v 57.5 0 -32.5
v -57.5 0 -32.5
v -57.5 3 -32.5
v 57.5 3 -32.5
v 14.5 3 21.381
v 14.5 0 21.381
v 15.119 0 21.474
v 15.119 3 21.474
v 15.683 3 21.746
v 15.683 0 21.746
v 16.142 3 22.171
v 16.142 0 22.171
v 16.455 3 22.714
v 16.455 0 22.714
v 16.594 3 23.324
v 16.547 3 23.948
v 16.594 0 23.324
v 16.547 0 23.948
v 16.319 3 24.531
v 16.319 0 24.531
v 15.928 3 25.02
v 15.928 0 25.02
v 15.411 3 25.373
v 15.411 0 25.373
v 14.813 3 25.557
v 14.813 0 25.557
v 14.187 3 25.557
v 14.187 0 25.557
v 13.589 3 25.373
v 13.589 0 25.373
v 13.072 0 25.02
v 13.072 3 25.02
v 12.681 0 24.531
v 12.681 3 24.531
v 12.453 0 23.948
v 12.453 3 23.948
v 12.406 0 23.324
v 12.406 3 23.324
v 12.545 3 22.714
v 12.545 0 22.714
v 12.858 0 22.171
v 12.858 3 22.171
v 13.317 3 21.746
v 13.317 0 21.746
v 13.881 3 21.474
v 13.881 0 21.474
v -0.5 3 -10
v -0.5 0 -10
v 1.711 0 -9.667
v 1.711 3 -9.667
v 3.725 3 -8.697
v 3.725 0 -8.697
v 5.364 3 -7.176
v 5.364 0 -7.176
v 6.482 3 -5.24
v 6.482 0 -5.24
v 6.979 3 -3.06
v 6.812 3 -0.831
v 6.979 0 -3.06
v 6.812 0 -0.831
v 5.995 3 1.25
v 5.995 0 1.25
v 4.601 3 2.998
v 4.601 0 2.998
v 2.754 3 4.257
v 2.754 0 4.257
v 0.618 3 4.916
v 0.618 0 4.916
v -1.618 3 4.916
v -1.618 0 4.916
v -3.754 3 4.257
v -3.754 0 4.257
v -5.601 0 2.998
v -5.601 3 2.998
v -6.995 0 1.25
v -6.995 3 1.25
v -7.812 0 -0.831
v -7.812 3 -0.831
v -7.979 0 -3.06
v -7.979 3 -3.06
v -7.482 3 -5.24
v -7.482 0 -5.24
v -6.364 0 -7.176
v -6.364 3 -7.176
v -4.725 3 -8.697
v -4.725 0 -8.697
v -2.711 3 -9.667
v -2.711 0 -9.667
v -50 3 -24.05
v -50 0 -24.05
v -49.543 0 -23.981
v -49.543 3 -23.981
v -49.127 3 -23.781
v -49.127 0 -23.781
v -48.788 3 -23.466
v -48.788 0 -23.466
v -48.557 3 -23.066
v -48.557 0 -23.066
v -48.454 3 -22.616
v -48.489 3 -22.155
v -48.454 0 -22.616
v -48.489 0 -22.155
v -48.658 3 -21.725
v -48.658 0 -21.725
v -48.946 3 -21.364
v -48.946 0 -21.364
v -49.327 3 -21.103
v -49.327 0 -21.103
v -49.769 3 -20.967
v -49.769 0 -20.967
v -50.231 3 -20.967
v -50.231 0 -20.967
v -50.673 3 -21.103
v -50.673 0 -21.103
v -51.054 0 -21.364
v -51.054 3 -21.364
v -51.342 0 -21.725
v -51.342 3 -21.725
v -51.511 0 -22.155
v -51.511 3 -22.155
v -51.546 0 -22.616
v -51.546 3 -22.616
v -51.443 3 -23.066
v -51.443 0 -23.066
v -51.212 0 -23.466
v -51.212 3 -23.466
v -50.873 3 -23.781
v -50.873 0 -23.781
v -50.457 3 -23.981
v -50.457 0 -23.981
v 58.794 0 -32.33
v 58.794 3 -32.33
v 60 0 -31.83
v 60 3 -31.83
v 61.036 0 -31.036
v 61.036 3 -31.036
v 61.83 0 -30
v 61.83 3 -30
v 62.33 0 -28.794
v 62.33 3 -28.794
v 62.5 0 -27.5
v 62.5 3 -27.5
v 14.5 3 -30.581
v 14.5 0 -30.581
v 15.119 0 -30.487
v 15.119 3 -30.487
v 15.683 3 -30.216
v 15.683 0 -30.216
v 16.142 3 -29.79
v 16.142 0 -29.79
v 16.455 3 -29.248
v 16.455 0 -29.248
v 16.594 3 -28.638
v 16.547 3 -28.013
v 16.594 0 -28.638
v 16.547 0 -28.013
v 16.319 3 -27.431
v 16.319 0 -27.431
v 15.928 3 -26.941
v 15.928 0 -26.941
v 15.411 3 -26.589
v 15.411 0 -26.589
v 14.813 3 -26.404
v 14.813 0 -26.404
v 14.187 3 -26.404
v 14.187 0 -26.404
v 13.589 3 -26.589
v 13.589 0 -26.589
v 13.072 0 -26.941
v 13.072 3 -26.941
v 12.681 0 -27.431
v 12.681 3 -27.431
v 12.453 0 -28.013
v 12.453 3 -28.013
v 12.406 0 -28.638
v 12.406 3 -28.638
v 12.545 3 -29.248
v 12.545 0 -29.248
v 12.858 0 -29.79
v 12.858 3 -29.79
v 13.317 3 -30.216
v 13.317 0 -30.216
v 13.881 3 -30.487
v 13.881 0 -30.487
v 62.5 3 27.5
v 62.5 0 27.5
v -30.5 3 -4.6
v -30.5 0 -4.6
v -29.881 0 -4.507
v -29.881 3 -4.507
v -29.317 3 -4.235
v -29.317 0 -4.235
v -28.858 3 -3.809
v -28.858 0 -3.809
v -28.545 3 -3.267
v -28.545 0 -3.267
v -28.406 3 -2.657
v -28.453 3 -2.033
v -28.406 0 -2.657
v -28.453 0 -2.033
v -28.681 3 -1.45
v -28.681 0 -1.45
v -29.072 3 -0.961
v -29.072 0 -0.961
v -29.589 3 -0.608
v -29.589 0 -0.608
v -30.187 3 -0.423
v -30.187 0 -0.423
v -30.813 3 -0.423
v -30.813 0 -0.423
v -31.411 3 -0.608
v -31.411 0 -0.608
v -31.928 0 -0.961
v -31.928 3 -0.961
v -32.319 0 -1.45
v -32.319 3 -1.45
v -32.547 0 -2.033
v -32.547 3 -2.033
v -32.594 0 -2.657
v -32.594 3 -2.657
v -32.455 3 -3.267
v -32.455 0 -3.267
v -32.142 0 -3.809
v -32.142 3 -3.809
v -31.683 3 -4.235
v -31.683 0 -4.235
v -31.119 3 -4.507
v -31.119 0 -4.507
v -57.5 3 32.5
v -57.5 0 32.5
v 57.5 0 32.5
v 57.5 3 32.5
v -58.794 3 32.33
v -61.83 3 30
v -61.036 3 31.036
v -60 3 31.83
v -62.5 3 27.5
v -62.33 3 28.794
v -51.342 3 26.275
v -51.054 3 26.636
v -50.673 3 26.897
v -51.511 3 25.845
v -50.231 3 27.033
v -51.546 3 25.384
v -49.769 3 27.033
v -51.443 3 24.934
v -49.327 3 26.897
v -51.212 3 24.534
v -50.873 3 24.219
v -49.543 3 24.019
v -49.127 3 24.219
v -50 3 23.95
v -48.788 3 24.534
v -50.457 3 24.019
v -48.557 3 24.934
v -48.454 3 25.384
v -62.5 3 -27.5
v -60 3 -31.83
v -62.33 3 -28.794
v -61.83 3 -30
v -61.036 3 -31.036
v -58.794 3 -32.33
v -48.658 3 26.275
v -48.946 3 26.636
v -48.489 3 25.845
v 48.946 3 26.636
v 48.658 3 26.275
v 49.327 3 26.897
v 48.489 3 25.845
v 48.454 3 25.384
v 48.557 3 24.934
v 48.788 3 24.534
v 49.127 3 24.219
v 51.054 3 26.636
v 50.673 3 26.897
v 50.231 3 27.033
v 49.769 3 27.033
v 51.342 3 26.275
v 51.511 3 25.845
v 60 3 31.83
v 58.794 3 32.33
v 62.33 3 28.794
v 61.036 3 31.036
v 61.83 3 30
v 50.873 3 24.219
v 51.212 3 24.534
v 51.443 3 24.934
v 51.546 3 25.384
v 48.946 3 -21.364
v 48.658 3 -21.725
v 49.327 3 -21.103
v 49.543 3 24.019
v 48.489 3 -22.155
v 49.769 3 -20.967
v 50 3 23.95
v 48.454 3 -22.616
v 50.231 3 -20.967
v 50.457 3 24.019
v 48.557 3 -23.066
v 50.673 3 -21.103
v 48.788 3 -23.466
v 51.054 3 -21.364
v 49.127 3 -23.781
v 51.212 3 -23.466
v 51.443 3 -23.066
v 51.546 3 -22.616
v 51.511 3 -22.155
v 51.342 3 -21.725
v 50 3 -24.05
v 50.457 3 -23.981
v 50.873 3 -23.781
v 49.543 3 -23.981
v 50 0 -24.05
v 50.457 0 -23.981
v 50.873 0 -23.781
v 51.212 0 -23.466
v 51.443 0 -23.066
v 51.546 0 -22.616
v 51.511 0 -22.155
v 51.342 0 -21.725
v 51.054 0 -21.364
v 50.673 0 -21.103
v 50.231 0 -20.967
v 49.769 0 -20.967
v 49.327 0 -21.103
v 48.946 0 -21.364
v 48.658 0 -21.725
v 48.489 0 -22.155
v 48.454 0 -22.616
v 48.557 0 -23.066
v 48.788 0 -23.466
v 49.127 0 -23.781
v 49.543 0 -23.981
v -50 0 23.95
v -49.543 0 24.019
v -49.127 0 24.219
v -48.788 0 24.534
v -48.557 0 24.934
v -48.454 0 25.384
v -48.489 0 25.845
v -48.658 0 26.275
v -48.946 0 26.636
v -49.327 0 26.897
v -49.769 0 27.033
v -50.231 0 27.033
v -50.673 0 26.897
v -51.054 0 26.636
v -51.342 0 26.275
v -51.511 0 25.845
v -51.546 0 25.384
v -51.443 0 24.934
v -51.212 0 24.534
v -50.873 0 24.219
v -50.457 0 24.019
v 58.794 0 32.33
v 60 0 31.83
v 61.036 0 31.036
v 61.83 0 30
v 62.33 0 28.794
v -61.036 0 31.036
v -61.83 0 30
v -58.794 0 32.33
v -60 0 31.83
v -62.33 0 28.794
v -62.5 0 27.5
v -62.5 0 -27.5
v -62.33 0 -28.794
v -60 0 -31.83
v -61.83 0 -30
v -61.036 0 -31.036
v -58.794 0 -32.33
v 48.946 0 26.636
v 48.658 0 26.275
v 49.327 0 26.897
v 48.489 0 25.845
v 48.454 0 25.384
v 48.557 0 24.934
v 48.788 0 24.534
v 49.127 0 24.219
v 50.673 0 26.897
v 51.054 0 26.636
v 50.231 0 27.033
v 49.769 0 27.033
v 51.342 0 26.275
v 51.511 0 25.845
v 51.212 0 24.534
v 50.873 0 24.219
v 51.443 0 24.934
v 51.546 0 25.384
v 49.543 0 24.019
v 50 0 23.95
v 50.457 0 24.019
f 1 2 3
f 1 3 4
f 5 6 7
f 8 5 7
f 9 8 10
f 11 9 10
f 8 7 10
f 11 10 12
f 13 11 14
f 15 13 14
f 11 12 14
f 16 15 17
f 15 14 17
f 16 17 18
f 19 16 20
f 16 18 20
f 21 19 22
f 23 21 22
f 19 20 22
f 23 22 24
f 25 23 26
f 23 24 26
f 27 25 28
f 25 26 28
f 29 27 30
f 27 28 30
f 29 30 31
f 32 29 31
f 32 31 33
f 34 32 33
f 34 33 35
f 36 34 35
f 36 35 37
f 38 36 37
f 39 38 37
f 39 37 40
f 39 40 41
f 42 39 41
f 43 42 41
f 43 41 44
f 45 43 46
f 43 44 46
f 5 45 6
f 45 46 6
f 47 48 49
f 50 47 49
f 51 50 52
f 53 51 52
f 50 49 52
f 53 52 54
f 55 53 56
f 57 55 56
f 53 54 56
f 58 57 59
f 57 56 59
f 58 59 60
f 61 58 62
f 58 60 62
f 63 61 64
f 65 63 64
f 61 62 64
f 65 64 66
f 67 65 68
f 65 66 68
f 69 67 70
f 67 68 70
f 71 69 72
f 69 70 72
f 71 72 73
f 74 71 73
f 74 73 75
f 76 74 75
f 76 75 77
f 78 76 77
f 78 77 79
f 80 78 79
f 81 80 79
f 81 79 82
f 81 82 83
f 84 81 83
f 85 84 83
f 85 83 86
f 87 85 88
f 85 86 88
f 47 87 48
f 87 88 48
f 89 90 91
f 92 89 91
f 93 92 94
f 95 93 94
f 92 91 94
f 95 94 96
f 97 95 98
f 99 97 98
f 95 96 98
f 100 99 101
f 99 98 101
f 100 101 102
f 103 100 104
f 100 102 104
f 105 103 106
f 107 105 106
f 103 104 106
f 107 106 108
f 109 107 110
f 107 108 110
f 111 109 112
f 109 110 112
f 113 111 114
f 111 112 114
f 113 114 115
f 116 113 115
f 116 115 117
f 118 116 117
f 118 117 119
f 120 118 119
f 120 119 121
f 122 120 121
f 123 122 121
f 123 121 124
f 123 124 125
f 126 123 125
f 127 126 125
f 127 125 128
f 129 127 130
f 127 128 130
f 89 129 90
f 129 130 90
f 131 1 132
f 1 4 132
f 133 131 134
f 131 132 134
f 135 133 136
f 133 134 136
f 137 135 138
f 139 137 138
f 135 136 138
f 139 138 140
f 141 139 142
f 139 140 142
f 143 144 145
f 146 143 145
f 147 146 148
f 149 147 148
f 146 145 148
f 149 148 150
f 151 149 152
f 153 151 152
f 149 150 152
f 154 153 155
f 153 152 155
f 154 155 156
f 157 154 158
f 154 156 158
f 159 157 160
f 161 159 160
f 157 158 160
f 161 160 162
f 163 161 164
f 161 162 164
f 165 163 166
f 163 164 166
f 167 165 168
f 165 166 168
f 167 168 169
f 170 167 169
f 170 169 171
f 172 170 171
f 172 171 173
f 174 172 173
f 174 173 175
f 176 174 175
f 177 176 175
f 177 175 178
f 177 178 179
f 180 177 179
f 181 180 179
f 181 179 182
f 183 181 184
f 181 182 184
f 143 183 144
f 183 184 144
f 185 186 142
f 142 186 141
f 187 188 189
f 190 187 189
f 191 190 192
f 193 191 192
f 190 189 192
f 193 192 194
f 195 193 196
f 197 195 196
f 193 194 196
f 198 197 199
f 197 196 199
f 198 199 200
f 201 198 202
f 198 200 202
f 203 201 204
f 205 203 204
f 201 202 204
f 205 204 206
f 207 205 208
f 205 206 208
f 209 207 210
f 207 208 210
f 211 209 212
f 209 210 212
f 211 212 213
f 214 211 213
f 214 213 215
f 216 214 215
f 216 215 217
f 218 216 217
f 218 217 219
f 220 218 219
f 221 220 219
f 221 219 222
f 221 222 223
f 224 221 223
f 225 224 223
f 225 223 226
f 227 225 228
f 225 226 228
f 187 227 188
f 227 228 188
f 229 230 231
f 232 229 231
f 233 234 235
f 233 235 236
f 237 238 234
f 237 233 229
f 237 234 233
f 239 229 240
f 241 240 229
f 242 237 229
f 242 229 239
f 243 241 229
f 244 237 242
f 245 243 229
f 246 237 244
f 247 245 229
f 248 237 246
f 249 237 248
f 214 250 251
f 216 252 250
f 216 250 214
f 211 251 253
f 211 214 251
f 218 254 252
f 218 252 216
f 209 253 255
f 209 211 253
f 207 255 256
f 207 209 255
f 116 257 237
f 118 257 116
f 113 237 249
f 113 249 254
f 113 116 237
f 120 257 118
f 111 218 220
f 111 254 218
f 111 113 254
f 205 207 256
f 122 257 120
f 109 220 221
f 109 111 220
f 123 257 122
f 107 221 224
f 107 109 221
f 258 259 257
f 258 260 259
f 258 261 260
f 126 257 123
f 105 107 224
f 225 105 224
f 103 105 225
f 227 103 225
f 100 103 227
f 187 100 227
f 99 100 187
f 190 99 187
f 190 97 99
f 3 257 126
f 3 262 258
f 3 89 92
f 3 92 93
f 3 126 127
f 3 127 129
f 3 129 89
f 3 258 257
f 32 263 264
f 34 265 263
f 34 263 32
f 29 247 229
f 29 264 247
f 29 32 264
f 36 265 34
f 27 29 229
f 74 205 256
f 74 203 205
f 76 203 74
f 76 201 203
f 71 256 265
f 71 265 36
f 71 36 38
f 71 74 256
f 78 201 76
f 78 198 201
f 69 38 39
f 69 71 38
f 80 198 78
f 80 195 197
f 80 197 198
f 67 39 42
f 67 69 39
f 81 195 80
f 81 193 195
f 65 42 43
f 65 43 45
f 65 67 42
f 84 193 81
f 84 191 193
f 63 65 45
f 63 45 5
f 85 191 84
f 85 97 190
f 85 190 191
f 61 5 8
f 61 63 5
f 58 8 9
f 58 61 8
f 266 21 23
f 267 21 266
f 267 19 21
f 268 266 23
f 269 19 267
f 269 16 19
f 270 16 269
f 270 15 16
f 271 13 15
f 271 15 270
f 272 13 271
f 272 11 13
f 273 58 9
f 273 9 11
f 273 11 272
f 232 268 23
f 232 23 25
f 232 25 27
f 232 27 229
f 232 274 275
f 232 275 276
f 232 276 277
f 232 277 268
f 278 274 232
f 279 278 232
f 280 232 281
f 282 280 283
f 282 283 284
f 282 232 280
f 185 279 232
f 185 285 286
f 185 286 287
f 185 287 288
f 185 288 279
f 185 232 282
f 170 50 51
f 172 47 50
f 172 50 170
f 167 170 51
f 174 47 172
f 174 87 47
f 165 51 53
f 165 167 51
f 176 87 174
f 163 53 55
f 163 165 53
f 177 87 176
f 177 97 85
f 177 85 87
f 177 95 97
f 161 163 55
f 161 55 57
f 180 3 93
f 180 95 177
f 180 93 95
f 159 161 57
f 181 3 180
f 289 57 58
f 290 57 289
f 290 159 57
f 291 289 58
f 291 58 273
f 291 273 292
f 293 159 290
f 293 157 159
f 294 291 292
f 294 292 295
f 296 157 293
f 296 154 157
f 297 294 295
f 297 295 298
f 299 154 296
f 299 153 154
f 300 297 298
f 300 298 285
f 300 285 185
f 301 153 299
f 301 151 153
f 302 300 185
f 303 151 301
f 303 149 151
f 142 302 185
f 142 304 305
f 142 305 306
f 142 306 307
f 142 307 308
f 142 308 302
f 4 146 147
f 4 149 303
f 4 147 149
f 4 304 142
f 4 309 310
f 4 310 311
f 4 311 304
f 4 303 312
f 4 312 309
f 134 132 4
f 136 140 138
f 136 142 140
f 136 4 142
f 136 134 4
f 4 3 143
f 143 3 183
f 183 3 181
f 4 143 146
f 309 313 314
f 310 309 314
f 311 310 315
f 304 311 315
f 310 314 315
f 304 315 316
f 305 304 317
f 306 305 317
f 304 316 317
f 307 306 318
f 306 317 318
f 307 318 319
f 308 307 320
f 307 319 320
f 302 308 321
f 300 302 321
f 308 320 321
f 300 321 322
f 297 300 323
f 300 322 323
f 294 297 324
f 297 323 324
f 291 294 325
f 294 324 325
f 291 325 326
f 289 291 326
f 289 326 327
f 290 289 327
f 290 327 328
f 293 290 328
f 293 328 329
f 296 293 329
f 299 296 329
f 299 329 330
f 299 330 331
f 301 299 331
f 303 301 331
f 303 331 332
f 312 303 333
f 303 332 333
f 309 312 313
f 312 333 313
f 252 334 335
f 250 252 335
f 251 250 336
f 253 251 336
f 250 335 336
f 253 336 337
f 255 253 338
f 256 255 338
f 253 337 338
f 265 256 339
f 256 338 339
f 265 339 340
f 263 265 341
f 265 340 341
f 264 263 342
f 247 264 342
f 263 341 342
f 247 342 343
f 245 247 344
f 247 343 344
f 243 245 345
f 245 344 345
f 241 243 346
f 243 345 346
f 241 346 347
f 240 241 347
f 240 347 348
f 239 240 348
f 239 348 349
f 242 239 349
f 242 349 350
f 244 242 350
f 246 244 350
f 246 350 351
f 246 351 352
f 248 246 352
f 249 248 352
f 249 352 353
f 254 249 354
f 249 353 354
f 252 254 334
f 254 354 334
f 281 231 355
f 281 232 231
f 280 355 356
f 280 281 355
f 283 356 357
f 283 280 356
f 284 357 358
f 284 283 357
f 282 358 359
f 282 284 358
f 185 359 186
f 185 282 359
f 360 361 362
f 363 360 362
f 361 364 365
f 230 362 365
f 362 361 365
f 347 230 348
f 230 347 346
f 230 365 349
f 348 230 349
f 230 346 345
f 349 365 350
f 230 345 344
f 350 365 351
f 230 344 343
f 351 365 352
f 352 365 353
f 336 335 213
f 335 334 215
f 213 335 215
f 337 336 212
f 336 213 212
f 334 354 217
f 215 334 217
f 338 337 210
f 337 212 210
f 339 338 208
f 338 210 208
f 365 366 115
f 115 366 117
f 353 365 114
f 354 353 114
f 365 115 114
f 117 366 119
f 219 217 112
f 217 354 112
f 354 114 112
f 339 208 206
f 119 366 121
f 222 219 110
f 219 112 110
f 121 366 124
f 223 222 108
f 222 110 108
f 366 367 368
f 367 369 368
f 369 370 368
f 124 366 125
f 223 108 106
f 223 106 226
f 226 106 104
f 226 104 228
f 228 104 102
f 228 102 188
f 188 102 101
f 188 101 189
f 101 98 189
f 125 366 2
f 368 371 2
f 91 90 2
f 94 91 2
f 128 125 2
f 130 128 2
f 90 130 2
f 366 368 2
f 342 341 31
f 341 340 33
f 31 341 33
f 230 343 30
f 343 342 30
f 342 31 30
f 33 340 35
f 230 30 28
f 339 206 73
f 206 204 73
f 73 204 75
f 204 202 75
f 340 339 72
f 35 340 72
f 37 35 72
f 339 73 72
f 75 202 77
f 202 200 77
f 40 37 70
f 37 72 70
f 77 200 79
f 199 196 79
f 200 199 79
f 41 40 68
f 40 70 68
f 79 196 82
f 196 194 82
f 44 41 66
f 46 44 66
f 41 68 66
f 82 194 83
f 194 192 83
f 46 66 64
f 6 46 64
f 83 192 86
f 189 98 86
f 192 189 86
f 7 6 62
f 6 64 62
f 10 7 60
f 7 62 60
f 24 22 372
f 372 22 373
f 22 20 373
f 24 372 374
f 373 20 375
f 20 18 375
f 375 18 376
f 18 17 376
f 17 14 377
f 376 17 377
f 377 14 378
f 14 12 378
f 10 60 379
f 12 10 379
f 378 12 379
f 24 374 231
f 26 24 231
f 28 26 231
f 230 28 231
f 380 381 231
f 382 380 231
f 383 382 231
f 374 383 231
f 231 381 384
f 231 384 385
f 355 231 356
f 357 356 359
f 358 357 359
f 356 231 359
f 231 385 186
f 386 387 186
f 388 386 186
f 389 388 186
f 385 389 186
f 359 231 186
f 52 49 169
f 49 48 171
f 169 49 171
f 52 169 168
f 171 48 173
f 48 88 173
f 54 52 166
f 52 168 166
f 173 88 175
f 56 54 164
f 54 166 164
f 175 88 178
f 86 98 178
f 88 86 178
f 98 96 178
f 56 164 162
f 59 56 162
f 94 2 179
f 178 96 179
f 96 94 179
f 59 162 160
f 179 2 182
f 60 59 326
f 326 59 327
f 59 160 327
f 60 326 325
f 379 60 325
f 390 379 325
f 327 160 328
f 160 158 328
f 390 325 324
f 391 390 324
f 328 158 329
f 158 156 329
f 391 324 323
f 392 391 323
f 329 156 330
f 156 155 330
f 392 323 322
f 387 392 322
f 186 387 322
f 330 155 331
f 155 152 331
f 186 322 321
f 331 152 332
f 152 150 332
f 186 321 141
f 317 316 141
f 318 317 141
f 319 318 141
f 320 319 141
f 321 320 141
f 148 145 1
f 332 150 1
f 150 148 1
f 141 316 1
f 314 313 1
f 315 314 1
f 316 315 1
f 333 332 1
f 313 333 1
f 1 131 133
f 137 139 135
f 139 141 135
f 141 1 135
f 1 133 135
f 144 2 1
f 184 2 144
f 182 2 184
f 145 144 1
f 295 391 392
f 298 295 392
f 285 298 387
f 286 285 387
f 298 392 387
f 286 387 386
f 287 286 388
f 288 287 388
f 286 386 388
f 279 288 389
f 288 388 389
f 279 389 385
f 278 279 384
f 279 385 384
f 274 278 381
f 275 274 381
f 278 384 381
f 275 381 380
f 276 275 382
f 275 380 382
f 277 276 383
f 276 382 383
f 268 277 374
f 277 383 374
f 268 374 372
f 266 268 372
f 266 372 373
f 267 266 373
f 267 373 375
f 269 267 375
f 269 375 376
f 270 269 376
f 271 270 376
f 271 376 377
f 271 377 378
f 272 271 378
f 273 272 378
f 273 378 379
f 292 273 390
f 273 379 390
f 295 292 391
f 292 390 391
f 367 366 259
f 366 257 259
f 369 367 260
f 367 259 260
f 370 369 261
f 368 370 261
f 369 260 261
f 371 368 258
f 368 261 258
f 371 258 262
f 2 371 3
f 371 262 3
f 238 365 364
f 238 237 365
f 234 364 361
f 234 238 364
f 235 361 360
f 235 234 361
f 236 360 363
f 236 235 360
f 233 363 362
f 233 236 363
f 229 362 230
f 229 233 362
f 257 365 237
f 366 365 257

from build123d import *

# Parameters (mm, degrees)
SKETCH_1_W          = 125
SKETCH_1_H          = 65
EXTRUDE_1_DEPTH     = 3
SKETCH_2_R          = 1.55
SKETCH_2_R_2        = 2.1
SKETCH_2_R_3        = 7.5
CUT_EXTRUDE_1_DEPTH = 3
FILLET_1_R          = 5


with BuildPart() as part:
    # 草图1 → 凸台-拉伸1 (new body)
    with BuildSketch(Plane(origin=(0, 0, 0), x_dir=(1, 0, 0), z_dir=(0, 1, 0))):
        Rectangle(SKETCH_1_W, SKETCH_1_H)
    extrude(amount=EXTRUDE_1_DEPTH)

    # 草图2 → 切除-拉伸1 (cut)
    with BuildSketch(Plane(origin=(0, 0, 0), x_dir=(-1, 0, 0), z_dir=(0, -1, 0))):
        with Locations(Location((-50, 22.5, 0), (0, 0, 90))):
            Circle(SKETCH_2_R)
        with Locations(Location((-50, -25.5, 0), (0, 0, 90))):
            Circle(SKETCH_2_R)
        with Locations(Location((50, 22.5, 0), (0, 0, 90))):
            Circle(SKETCH_2_R)
        with Locations(Location((50, -25.5, 0), (0, 0, 90))):
            Circle(SKETCH_2_R)
        with Locations(Location((-14.5, -23.480762114, 0), (0, 0, 90))):
            Circle(SKETCH_2_R_2)
        with Locations(Location((-14.5, 28.480762114, 0), (0, 0, 90))):
            Circle(SKETCH_2_R_2)
        with Locations(Location((30.5, 2.5, 0), (0, 0, 90))):
            Circle(SKETCH_2_R_2)
        with Locations(Location((0.5, 2.5, 0), (0, 0, 90))):
            Circle(SKETCH_2_R_3)
    extrude(amount=-CUT_EXTRUDE_1_DEPTH, mode=Mode.SUBTRACT)

    # 圆角1
    fillet_1_edges = [part.edges().sort_by_distance(p)[0] for p in [
        (62.5, 1.5, 32.5),
        (-62.5, 1.5, 32.5),
        (-62.5, 1.5, -32.5),
        (62.5, 1.5, -32.5),
    ]]
    fillet(fillet_1_edges, radius=FILLET_1_R)


solid = part.part
